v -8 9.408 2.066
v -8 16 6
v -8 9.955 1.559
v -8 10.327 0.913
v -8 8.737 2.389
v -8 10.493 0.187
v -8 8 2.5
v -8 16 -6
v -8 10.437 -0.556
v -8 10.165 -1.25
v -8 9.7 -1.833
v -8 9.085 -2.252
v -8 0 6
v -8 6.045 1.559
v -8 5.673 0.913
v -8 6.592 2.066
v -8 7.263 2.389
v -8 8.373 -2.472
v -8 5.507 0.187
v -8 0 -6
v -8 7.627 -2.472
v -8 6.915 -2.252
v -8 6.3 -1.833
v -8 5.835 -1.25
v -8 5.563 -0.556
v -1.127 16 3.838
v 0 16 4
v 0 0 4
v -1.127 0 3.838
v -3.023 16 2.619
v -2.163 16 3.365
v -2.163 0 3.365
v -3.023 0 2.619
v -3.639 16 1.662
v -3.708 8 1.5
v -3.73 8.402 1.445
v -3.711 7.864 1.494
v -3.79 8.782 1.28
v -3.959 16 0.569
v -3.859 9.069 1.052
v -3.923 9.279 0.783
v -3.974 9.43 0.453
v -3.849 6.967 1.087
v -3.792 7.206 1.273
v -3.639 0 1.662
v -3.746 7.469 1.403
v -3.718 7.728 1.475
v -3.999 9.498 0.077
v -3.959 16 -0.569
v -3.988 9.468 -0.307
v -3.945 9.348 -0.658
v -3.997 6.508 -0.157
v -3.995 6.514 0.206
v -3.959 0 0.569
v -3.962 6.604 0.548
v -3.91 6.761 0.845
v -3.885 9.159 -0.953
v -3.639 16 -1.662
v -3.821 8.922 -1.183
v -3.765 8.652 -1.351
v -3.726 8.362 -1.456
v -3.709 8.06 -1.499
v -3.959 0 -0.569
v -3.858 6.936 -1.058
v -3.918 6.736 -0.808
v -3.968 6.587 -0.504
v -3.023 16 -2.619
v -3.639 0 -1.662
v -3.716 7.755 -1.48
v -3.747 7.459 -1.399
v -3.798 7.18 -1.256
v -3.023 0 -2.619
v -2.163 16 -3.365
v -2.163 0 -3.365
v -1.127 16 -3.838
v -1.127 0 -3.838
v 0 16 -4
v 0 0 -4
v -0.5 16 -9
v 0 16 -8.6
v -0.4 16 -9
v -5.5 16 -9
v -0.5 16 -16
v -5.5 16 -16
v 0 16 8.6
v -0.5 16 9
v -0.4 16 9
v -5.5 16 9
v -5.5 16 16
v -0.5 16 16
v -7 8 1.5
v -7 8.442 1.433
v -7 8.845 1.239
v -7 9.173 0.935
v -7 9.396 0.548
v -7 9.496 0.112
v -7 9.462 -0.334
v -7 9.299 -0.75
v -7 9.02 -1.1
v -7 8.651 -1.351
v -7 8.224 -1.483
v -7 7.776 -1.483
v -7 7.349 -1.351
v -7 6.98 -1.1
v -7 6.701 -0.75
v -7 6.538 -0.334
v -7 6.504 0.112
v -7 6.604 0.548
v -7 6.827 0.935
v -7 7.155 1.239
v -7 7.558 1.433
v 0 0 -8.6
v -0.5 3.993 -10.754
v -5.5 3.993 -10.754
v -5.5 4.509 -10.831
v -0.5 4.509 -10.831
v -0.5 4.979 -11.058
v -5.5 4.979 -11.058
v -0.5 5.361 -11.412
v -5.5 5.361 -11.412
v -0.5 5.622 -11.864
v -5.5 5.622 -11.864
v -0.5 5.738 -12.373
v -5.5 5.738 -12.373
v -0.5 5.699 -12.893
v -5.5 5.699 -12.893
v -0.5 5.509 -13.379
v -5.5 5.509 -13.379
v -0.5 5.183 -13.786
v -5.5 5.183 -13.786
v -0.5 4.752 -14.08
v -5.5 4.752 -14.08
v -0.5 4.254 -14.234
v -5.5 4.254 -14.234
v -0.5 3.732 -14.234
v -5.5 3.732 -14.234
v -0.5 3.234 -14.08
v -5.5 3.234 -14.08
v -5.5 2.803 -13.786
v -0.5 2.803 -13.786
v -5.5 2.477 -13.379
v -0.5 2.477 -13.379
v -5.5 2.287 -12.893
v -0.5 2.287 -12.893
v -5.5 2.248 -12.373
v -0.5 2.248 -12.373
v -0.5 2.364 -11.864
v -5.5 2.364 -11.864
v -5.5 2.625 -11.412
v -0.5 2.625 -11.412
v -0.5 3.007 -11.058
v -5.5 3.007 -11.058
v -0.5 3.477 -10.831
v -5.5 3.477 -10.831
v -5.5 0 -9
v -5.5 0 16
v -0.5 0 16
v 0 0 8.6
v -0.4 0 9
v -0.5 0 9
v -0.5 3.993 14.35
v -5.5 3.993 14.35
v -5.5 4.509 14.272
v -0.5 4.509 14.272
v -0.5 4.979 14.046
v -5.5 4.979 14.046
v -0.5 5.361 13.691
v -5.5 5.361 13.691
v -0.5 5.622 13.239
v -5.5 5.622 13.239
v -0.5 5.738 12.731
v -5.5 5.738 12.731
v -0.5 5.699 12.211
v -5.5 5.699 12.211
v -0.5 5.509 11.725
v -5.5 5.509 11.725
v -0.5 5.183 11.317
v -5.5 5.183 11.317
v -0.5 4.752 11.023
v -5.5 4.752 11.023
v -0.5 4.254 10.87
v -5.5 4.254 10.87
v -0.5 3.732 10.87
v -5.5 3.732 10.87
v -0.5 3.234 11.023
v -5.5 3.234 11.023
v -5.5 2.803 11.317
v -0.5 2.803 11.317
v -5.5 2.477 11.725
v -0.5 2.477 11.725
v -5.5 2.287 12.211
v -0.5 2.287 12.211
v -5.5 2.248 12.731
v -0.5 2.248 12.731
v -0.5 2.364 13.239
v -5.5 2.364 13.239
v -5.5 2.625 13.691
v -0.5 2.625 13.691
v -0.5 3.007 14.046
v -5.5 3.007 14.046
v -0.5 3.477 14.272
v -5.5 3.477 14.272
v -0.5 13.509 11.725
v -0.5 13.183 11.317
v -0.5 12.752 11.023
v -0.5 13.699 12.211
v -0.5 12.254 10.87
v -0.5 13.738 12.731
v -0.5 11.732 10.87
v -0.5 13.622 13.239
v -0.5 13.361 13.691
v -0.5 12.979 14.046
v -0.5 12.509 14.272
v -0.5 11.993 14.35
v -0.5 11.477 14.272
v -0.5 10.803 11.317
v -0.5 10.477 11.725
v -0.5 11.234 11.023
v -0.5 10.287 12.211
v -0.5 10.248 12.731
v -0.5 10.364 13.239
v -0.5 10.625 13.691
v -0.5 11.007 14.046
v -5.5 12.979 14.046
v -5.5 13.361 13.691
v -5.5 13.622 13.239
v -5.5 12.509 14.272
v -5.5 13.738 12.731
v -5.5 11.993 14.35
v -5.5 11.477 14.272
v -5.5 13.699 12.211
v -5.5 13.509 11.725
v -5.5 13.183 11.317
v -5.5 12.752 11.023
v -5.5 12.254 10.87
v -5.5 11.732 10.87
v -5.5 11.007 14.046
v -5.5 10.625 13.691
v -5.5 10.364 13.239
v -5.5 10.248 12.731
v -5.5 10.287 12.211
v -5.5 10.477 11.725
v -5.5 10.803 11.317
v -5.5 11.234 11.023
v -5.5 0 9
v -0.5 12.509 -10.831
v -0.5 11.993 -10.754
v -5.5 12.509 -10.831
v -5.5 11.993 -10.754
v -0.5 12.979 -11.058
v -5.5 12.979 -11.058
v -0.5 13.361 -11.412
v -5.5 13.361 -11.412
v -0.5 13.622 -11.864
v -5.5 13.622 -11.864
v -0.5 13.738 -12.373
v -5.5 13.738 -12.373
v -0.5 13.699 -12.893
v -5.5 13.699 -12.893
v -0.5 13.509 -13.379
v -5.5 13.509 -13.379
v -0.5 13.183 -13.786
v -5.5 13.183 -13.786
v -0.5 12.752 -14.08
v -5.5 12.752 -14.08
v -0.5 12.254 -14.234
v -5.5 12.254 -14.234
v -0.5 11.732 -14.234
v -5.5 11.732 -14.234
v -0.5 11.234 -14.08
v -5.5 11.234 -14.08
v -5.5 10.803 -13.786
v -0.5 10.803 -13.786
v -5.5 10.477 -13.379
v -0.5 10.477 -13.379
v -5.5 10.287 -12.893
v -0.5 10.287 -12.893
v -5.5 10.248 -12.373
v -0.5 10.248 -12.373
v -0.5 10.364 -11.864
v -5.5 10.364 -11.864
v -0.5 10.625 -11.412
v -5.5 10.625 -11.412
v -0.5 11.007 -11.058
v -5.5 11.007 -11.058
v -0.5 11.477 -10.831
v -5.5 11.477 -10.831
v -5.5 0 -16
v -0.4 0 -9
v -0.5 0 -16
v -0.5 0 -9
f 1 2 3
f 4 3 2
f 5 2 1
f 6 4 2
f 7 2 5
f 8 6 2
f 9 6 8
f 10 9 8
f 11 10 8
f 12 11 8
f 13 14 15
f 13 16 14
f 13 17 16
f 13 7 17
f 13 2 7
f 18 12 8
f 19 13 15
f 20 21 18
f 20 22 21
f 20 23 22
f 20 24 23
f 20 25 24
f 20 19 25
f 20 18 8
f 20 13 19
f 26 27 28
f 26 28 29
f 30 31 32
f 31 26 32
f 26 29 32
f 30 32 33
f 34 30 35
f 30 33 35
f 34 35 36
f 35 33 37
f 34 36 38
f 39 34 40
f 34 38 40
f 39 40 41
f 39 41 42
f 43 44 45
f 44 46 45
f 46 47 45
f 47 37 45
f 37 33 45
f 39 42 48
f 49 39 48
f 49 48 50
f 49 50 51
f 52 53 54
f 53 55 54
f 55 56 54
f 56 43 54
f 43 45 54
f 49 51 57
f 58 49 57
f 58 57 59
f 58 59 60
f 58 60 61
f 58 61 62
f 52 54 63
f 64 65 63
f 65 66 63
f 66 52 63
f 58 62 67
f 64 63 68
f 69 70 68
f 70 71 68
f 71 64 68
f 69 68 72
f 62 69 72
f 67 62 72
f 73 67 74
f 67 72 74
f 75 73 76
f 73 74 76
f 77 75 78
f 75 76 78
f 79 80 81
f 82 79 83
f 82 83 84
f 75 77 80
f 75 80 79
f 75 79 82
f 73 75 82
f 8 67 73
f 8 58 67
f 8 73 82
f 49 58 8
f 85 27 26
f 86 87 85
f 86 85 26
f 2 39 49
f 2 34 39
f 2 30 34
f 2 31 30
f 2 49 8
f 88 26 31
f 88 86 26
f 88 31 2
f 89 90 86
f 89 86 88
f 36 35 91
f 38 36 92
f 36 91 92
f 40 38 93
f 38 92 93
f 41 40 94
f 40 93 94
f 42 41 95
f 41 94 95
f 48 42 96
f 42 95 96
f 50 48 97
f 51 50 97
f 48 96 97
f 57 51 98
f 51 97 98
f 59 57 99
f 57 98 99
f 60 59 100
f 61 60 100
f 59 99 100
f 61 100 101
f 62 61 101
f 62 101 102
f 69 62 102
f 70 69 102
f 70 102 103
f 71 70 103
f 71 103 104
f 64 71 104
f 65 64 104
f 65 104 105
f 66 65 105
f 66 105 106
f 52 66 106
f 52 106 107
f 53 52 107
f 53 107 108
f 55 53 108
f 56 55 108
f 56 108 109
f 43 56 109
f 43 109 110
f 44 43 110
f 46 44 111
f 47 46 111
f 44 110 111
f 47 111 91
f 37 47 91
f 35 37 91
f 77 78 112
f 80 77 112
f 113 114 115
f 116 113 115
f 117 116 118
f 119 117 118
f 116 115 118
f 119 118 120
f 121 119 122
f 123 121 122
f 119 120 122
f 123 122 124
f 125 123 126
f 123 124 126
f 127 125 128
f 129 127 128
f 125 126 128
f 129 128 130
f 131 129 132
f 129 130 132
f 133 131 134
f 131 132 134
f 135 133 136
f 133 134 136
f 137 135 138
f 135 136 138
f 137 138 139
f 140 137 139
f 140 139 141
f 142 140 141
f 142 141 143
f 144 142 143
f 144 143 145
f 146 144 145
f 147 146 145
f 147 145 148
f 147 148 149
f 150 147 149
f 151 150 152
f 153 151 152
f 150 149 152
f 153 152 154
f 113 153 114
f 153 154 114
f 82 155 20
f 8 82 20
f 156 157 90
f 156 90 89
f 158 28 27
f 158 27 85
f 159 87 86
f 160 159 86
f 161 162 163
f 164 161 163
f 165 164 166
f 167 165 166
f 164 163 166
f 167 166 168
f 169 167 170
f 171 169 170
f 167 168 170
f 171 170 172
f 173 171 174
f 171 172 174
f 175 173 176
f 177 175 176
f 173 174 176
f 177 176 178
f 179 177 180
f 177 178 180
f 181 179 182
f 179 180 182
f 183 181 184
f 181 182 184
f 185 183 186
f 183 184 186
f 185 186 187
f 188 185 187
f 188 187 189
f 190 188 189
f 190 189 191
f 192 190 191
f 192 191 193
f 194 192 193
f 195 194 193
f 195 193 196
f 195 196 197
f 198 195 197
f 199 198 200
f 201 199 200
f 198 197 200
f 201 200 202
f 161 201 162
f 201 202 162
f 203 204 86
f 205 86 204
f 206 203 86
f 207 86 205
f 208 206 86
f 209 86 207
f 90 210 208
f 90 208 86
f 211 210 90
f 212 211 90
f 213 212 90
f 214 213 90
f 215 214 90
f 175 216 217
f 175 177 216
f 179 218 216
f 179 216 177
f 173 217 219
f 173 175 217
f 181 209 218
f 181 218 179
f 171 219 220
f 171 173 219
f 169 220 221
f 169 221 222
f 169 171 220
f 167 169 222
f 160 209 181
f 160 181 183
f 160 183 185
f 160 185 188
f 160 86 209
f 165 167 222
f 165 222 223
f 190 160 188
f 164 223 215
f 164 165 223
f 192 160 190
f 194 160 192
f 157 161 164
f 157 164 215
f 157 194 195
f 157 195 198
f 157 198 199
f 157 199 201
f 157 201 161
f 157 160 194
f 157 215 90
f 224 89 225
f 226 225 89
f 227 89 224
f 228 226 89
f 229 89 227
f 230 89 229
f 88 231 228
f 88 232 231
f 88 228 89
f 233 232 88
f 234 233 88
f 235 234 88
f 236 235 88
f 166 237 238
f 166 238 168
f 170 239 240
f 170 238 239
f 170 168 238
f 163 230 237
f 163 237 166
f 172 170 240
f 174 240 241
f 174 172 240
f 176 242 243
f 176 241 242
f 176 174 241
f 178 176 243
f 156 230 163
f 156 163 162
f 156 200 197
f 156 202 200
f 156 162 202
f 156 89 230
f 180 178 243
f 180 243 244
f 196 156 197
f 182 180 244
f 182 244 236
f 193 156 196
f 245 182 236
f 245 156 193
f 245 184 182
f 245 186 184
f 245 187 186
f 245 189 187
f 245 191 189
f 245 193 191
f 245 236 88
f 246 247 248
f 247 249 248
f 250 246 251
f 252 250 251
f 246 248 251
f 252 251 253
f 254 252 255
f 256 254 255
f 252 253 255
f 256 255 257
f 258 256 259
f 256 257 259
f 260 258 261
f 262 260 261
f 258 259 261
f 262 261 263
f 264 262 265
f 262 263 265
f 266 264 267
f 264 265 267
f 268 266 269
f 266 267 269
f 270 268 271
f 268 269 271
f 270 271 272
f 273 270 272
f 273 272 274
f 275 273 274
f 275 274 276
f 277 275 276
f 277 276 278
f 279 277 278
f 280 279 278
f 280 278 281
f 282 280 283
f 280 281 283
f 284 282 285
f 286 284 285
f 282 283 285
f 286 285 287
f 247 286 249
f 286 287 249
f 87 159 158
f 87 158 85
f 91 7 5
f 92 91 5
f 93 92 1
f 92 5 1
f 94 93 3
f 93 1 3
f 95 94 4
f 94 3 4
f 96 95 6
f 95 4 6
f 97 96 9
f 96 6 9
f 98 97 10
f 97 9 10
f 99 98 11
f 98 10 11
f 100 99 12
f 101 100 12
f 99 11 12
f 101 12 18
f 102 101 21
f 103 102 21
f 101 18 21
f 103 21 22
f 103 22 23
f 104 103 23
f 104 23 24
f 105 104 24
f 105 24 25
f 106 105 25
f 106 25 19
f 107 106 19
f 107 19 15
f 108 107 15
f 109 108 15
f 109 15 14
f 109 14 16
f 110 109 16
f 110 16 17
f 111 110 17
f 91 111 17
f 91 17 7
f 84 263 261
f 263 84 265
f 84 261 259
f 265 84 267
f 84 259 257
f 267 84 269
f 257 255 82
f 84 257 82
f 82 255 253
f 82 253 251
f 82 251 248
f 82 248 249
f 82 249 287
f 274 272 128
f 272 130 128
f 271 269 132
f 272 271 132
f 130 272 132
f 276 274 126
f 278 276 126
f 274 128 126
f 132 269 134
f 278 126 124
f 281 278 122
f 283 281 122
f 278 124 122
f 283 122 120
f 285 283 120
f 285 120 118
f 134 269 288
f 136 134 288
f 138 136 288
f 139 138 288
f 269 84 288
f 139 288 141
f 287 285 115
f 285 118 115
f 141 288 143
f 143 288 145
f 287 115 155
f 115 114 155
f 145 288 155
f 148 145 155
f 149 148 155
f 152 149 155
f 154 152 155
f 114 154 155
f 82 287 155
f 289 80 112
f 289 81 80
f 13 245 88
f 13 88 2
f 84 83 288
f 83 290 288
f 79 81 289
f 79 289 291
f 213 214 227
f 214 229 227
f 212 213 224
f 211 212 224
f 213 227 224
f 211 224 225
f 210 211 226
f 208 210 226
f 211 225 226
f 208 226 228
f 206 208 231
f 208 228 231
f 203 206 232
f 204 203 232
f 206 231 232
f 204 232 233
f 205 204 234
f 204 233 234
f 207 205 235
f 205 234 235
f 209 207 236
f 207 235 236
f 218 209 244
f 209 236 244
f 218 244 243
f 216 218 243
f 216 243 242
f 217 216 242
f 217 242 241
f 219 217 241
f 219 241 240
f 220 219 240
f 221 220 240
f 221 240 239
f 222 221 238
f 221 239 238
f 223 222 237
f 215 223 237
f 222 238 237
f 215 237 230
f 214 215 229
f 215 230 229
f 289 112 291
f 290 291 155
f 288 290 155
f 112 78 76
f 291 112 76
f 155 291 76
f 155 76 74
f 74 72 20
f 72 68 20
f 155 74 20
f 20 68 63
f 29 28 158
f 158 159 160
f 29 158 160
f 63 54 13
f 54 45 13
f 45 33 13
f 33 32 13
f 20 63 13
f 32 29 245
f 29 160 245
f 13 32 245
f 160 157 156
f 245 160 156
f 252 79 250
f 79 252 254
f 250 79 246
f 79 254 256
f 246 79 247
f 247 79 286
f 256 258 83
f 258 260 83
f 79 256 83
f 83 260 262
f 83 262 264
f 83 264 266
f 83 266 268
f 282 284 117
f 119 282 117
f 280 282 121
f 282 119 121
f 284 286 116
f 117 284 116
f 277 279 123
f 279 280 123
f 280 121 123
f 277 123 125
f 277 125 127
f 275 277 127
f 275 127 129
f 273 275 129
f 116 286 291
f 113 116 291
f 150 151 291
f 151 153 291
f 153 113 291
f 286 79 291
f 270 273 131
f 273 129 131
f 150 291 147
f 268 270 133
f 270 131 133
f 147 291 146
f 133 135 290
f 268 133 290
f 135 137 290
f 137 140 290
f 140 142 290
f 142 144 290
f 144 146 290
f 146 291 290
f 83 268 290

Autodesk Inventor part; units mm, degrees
ref_plane "YZ Plane" through (0, 0, 0) normal (1, 0, 0) x (0, 1, 0)
ref_plane "XZ Plane" through (0, 0, 0) normal (0, 1, 0) x (-1, 0, 0)
ref_plane "XY Plane" through (0, 0, 0) normal (0, 0, 1) x (1, 0, 0)
sketch "Sketch1" plane through (0, 0, 0) normal (0, 1, 0) x (-1, 0, 0)
  arc A0 (0, -4) -> (0, 4) centre (0, 0) ccw
  line L0 (0, 4) -> (0, -4) construction
  line L1 (0, 4) -> (0, 9)
  line L2 (0, -4) -> (0, -9)
  line L3 (0, 9) -> (0.5, 9)
  line L4 (0.5, 9) -> (0.5, 16)
  line L5 (0, -9) -> (0.5, -9)
  line L6 (0.5, -9) -> (0.5, -16)
  line L7 (0.5, 16) -> (5.5, 16)
  line L8 (0.5, -16) -> (5.5, -16)
  line L9 (5.5, 16) -> (5.5, 9)
  line L10 (5.5, -16) -> (5.5, -9)
  line L11 (8, 0) -> (8, -6) construction
  line L12 (8, 0) -> (8, 6) construction
  line L13 (8, 6) -> (8, -6)
  line L14 (5.5, 9) -> (8, 6)
  line L15 (5.5, -9) -> (8, -6)
  dimension "d0" = 8
  dimension "d1" = 8
  dimension "d2" = 5
  dimension "d3" = 5
  dimension "d4" = 0.5
  dimension "d5" = 7
  dimension "d6" = 7
  dimension "d8" = 5
  dimension "d9" = 5
  dimension "d10" = 0
  dimension "d11" = 7
  dimension "d12" = 7
  dimension "d13" = 6
  dimension "d14" = 6
  dimension "d15" = 8
  dimension "d17" = 140.194
extrude "Extrusion1" add sketch "Sketch1" along normal blind 16
sketch "Sketch2" plane through (-8, 0, -6) normal (-1, 0, 0) x (0, 0, 1)
  line L0 (15, 0) -> (22, 0) projected
  line L1 (22, 0) -> (22, 16) projected
  line L2 (15, 16) -> (22, 16) projected
  line L3 (15, 0) -> (15, 16) projected
  line L4 (0, 0) -> (12, 0) projected
  line L5 (12, 0) -> (12, 16) projected
  line L6 (0, 16) -> (12, 16) projected
  line L7 (0, 0) -> (0, 16) projected
  line L8 (-10, 0) -> (-3, 0) projected
  line L9 (-3, 0) -> (-3, 16) projected
  line L10 (-10, 16) -> (-3, 16) projected
  line L11 (-10, 0) -> (-10, 16) projected
  circle A0 centre (6, 8) radius 1.5
  line L12 (4, 16) -> (12, 16)
  line L13 (8, 16) -> (20.5, 16)
  line L14 (0, 16) -> (16, 16)
  line L15 (8, 16) -> (-4.5, 16)
  line L16 (-1.3536, 16) -> (-7.8536, 16)
  line L17 (6.1, 7.993) -> (18.6, 7.993) construction
  line L18 (16.8536, 0) -> (16.8536, 16) construction
  line L19 (18.6, 7.993) -> (18.6, 3.993) construction
  line L20 (18.6, 3.993) -> (18.6, 11.993) construction
  line L21 (6.1, 7.993) -> (-6.5036, 7.993) construction
  line L22 (-6.5036, 7.993) -> (-6.5036, 3.993) construction
  line L23 (-6.5036, 3.993) -> (-6.5036, 11.993) construction
  circle A1 centre (18.6, 3.993) radius 1.75
  circle A2 centre (18.6, 11.993) radius 1.75
  circle A3 centre (-6.5036, 3.993) radius 1.75
  circle A4 centre (-6.5036, 11.993) radius 1.75
  point P0 (6, 0)
  point P1 (8, 0)
  dimension "d22" = 3
  dimension "d38" = 12.5
  dimension "d39" = 12.5
  dimension "d40" = 4
  dimension "d41" = 8
  dimension "d42" = 3.5
  dimension "d43" = 3.5
  dimension "d44" = 3.5
  dimension "d45" = 3.5
  dimension "d46" = 3.6
  dimension "d47" = 90
  dimension "d48" = 90
  dimension "d49" = 90
  dimension "d50" = 90
  dimension "d51" = 5.1464
  dimension "d52" = 28.5036
  dimension "d53" = 8.007
  dimension "d54" = 0
  dimension "d55" = 0
  dimension "d56" = 1.5
  dimension "d57" = 0
  dimension "d58" = 16
  dimension "d59" = 6
  dimension "d60" = 10
  dimension "d61" = 14
  dimension "d62" = 16
  dimension "d63" = 15.9
  dimension "d64" = 16
  dimension "d65" = 8
  dimension "d66" = 22
  dimension "d67" = 23.3535
  dimension "d68" = 4.007
  dimension "d69" = 12.007
  dimension "d70" = 29.8535
extrude "Extrusion3" cut sketch "Sketch2" against normal through all contours A0
chamfer "Chamfer1" distance 1 angle 45 1 edges at (-8, 8, -1.5)
chamfer "Chamfer2" distance 0.4 angle 45 2 edges at (0, 8, 9) (0, 8, -9)
extrude "Extrusion5" cut sketch "Sketch2" against normal blind 15 contours A1 | A2 | A3 | A4
properties part number "reverse gear  upper base bearing holder 1"
